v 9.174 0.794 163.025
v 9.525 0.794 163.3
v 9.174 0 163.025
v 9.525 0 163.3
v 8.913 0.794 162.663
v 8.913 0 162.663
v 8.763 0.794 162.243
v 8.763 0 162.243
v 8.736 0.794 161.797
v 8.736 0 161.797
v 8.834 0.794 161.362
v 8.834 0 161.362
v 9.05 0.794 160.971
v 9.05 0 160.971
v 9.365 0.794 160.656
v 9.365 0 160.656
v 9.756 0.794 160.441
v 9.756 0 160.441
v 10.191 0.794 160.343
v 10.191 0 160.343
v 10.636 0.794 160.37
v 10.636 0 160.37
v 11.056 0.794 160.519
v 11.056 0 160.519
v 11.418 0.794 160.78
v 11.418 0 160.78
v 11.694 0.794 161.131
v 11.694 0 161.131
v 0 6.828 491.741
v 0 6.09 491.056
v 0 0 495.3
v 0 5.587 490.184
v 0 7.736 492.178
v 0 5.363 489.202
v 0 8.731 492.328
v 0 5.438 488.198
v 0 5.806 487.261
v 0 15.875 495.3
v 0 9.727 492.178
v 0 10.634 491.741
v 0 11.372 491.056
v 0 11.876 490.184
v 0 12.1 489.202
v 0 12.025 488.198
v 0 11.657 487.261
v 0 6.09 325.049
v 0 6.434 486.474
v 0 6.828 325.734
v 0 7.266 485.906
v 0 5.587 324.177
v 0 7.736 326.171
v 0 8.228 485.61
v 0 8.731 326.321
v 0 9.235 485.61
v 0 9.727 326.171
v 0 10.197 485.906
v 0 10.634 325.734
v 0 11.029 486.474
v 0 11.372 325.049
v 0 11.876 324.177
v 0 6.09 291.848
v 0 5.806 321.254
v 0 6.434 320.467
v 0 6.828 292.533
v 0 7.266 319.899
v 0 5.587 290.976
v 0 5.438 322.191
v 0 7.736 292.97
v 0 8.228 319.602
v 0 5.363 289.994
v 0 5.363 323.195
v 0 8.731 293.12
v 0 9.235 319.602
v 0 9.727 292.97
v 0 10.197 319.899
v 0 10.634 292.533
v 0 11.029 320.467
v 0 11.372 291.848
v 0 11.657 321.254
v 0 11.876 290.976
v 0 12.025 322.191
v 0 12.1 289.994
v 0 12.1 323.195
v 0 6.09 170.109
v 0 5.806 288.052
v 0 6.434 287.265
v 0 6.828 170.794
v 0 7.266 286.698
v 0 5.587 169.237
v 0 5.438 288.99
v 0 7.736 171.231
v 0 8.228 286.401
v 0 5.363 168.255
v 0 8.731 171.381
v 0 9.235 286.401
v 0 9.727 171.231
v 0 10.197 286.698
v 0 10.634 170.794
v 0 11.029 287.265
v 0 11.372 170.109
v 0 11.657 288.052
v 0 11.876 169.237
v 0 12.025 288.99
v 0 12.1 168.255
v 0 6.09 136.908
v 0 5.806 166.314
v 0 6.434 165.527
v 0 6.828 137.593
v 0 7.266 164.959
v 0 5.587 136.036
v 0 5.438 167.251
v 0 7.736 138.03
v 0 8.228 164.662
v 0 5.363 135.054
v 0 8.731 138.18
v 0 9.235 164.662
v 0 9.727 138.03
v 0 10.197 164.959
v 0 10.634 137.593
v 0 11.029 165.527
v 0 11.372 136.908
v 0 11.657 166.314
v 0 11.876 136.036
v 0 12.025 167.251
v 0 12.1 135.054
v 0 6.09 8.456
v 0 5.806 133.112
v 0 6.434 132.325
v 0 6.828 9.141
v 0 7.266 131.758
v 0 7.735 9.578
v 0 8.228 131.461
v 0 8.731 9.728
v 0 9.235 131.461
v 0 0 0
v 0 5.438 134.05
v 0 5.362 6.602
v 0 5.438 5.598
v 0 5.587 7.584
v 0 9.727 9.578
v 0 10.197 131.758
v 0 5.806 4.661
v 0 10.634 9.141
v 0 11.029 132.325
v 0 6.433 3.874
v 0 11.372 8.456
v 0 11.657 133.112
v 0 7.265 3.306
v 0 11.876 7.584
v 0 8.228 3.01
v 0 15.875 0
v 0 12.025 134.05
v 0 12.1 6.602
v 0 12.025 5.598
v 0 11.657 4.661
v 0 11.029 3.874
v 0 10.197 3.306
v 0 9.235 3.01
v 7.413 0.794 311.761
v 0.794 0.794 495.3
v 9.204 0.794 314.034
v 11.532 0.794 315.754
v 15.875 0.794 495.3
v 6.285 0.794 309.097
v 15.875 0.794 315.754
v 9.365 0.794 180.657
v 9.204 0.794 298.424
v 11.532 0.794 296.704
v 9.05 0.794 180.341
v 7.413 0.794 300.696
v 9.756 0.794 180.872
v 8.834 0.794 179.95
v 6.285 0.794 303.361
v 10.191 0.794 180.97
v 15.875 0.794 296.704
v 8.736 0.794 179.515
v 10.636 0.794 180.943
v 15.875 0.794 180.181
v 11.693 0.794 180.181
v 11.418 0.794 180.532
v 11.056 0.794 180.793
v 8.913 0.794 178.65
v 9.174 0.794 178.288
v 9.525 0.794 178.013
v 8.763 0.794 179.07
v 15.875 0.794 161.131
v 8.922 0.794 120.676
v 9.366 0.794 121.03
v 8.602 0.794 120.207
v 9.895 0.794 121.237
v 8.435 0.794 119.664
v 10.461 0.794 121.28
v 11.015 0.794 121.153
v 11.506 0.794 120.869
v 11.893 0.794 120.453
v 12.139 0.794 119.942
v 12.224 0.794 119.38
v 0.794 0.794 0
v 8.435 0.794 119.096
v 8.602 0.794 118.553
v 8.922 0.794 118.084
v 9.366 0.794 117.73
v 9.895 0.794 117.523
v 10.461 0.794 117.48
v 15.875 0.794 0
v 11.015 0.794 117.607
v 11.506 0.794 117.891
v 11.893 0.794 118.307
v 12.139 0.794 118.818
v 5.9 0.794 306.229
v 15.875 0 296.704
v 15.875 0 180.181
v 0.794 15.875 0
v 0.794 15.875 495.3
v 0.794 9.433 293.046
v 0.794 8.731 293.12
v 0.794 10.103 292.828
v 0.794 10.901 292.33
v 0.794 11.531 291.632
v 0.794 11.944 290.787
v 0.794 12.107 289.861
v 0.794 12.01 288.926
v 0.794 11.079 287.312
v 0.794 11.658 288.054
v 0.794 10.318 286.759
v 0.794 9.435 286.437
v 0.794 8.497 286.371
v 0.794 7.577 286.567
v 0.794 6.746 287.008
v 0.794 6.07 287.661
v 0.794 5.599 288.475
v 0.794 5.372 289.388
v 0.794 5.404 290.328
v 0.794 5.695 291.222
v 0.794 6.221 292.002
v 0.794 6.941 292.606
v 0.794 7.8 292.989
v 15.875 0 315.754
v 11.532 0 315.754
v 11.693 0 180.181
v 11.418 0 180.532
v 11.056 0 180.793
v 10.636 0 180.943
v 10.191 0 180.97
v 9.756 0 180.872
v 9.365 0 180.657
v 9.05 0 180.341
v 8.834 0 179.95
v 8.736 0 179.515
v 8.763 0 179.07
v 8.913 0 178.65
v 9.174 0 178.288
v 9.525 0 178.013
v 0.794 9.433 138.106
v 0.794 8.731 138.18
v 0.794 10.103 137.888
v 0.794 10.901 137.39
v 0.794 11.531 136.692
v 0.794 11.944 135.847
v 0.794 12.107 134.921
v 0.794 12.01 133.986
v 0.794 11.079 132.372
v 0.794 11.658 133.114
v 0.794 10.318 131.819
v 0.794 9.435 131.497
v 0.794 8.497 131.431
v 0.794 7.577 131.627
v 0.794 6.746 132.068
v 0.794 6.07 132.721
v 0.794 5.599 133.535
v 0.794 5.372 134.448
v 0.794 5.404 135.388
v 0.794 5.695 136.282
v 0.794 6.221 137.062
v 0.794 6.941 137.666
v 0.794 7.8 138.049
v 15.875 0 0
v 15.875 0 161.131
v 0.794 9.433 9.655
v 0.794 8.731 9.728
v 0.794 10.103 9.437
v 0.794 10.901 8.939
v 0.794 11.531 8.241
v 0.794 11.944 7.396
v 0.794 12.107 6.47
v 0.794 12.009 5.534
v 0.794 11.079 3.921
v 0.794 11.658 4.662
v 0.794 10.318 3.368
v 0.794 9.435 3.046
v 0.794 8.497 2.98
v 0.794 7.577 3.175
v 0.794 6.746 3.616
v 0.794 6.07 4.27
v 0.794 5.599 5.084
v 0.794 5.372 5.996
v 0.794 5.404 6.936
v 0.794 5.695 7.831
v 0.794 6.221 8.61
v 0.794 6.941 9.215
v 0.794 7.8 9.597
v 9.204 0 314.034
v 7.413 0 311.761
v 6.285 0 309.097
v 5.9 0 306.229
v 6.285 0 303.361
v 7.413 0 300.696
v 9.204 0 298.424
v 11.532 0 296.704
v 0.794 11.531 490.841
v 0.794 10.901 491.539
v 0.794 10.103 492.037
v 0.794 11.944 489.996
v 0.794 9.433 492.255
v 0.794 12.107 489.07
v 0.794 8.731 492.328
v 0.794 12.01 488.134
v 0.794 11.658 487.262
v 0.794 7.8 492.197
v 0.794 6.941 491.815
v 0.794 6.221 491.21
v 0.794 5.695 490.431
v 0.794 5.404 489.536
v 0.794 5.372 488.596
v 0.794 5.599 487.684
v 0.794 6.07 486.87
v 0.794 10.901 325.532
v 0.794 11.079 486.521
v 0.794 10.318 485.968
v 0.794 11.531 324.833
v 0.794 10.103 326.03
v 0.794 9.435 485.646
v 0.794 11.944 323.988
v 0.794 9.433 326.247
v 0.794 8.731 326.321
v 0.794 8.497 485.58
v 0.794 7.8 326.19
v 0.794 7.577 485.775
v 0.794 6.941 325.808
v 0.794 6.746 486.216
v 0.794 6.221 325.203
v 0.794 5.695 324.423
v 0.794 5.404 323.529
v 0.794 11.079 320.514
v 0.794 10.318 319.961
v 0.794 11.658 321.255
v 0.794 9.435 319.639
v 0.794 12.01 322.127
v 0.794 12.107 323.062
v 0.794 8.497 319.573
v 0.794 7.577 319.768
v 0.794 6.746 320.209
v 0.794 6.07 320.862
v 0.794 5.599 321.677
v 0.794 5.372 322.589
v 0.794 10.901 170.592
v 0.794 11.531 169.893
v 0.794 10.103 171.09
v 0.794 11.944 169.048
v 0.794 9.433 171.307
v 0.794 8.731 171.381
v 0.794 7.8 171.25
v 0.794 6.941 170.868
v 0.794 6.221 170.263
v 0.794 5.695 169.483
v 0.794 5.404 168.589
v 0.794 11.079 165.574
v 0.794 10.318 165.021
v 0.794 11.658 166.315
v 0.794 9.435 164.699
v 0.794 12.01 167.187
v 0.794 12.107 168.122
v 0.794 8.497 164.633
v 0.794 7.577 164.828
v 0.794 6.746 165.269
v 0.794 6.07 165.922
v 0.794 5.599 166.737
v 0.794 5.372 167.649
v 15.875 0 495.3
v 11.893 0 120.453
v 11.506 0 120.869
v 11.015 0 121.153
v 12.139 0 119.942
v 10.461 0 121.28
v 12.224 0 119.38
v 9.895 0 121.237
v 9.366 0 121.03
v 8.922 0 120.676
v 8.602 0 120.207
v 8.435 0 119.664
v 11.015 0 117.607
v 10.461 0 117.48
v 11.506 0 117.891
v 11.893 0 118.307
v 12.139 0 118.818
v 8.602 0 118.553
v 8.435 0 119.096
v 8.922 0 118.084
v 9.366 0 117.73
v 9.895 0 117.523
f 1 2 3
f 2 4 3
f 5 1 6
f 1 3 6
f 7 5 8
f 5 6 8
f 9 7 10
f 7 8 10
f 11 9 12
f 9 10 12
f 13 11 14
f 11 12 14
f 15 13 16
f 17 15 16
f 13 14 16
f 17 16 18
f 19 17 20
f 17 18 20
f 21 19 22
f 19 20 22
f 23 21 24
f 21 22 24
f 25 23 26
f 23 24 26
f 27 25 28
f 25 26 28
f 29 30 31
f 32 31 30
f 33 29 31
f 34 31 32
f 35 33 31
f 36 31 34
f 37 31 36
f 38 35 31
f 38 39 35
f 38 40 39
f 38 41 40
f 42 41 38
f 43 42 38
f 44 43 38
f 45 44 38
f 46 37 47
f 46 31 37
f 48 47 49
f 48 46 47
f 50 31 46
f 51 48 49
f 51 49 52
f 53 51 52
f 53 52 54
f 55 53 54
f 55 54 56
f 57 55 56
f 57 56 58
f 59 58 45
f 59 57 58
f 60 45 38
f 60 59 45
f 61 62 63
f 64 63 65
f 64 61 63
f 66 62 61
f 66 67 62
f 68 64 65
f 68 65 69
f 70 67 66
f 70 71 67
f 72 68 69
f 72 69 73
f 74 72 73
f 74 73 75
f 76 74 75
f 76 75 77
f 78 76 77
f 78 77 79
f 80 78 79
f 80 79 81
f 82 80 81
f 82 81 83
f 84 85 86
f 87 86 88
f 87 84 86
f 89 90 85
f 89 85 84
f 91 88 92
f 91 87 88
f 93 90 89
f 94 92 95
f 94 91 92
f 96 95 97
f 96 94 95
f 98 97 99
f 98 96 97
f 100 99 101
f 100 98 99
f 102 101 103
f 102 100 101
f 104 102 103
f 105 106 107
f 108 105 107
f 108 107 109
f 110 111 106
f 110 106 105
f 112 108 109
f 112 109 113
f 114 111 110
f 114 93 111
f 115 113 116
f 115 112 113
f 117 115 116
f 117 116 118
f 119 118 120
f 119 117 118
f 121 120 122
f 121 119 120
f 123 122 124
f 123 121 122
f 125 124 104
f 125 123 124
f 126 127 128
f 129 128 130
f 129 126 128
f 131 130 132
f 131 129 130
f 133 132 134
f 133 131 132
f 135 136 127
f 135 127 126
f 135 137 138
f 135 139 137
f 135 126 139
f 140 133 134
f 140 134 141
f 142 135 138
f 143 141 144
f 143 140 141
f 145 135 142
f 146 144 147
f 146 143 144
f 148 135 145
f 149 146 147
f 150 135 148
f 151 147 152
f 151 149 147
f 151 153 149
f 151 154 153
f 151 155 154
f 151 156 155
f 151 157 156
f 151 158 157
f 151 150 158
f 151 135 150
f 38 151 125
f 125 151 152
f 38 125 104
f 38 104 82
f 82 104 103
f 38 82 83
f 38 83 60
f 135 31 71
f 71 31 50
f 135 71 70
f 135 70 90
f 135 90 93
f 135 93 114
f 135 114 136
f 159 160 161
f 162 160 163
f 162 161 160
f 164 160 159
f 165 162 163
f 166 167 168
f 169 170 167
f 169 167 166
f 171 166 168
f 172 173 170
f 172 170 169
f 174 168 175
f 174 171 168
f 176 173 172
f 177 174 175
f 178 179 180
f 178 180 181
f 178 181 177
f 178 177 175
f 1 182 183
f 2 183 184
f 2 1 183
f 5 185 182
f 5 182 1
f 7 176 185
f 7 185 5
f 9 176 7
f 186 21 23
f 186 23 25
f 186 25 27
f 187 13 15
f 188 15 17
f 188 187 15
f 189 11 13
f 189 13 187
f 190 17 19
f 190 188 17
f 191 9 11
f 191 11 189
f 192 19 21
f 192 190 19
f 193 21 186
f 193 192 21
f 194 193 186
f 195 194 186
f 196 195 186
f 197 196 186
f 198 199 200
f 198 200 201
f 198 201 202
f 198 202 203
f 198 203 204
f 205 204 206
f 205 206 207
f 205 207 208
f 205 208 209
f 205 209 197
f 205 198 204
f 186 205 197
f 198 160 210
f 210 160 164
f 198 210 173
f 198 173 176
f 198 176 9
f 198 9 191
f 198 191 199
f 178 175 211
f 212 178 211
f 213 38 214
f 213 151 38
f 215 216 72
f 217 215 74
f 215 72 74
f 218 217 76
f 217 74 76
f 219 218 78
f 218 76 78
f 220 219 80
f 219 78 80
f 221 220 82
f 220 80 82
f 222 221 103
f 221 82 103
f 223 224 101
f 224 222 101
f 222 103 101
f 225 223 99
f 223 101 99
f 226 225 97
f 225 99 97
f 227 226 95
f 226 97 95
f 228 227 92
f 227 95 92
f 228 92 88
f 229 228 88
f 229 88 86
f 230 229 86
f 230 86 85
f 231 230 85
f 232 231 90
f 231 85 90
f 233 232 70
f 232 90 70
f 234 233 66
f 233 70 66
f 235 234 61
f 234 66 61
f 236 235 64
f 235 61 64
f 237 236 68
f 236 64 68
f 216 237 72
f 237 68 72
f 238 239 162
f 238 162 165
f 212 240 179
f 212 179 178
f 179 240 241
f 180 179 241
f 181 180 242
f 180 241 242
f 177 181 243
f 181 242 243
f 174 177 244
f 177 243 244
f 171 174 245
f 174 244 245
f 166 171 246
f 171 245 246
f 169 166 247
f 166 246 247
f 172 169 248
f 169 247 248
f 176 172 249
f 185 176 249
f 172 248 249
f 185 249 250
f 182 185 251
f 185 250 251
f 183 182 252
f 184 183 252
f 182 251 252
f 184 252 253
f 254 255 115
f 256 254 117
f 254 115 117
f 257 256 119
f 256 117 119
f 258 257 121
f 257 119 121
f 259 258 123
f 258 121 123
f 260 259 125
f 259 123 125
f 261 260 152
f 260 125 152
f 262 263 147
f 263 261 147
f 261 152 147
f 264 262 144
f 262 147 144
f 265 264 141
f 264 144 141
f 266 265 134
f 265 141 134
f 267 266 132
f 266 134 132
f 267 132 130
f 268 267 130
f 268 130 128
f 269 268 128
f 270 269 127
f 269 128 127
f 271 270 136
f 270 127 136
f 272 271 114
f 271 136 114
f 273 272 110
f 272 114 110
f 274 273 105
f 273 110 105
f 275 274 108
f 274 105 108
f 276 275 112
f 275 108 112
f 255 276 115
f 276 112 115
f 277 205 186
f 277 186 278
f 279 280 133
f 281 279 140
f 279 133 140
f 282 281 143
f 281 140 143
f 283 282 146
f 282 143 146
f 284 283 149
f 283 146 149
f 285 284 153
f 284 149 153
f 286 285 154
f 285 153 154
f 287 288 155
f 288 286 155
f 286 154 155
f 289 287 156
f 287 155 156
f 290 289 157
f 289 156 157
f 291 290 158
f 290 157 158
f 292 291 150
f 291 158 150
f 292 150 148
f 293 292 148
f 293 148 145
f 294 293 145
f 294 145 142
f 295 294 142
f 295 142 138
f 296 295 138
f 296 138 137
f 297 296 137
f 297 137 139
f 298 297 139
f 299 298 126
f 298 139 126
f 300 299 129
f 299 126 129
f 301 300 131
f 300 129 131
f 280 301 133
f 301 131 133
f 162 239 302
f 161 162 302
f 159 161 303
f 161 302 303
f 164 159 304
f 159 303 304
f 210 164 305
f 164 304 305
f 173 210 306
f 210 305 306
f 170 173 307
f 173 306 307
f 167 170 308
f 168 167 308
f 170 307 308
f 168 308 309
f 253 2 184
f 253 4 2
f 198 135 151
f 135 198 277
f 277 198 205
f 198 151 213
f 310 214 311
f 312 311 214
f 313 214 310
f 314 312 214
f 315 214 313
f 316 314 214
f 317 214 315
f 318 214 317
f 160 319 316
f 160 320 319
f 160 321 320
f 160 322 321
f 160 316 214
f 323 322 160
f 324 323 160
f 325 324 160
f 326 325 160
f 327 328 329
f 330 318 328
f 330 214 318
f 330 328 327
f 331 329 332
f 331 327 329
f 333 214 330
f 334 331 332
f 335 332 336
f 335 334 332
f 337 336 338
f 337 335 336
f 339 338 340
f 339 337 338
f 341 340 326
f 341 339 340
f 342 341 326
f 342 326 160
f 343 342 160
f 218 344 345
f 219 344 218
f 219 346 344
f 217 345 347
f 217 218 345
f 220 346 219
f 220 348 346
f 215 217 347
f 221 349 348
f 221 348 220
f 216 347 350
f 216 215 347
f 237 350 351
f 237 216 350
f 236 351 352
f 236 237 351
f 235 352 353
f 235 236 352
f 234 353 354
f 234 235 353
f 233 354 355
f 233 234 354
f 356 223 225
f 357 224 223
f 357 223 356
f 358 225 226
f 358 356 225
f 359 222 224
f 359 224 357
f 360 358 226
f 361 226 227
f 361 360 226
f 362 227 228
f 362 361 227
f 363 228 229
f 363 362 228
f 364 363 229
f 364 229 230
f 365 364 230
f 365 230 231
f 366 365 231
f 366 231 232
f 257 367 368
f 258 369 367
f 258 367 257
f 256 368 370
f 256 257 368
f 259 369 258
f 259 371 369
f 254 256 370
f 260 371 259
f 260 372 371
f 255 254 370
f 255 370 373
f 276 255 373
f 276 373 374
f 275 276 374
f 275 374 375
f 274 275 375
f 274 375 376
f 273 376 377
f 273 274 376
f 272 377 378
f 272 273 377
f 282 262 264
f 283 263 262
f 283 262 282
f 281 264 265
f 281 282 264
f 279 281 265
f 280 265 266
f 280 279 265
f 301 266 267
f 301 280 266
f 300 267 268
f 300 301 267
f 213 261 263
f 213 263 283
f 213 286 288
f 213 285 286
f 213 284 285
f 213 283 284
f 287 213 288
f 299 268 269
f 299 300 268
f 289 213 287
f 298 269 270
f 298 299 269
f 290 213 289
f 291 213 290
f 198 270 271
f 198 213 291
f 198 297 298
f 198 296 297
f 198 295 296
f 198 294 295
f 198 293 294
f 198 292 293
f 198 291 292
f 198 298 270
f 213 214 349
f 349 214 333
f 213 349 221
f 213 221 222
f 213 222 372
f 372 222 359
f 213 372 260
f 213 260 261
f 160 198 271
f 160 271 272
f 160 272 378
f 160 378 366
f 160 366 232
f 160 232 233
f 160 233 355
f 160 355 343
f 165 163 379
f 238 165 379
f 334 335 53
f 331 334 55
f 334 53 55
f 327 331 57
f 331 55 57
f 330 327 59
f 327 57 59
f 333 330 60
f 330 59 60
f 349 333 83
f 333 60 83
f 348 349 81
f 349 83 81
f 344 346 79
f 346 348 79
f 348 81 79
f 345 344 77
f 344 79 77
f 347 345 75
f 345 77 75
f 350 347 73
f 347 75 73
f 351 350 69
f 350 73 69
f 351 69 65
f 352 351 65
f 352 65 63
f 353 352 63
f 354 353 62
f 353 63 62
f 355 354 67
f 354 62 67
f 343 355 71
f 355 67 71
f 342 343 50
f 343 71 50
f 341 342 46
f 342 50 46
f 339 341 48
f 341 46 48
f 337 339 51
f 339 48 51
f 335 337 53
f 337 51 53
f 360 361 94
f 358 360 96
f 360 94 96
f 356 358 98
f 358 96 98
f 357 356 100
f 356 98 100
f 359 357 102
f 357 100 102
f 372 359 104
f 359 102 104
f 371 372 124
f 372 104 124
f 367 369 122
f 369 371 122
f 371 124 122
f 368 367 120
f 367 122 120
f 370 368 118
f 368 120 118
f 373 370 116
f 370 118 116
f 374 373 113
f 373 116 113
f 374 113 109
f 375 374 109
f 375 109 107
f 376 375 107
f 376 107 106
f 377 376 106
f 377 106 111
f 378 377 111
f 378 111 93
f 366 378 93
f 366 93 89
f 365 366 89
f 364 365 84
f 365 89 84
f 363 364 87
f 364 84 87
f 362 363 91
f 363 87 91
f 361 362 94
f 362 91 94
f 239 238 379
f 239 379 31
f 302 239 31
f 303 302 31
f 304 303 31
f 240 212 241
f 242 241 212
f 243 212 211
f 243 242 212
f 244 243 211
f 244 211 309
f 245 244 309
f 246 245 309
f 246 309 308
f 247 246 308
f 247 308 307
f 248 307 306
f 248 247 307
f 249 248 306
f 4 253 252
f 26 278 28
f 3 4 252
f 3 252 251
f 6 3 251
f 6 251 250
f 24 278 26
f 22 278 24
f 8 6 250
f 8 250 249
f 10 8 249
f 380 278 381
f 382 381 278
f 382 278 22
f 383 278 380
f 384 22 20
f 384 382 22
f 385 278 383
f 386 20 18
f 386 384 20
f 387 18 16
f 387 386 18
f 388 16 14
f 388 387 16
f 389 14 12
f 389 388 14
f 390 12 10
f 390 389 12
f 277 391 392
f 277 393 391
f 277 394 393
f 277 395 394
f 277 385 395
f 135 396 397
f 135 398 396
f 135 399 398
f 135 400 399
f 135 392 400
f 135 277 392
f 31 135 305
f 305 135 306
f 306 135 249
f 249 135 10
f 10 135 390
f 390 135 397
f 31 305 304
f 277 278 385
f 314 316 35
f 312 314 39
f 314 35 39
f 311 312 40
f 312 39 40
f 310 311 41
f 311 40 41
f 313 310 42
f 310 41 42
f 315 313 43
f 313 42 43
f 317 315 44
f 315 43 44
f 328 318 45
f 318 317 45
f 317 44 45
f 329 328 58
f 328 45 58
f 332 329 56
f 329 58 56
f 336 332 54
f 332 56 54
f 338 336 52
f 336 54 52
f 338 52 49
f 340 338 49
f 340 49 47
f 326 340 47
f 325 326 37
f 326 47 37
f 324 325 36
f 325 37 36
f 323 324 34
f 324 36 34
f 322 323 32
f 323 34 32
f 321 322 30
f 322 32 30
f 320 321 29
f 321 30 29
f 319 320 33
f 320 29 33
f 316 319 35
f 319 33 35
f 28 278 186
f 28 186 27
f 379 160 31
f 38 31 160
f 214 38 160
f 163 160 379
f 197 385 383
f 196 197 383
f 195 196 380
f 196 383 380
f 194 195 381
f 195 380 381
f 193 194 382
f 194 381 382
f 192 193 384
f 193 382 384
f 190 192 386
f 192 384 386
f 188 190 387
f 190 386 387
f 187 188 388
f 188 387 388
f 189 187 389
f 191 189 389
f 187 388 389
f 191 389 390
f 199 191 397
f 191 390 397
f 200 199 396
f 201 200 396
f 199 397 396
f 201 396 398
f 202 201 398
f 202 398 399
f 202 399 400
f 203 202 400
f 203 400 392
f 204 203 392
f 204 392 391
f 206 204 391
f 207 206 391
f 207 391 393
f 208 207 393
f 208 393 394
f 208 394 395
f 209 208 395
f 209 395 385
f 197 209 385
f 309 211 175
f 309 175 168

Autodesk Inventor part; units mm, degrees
ref_plane "YZ Plane" through (0, 0, 0) normal (1, 0, 0) x (0, 1, 0)
ref_plane "XZ Plane" through (0, 0, 0) normal (0, 1, 0) x (-1, 0, 0)
ref_plane "XY Plane" through (0, 0, 0) normal (0, 0, 1) x (1, 0, 0)
sketch "Sketch1" plane through (0, 0, 0) normal (0, 0, 1) x (1, 0, 0)
  line L0 (0, 0) -> (0, 15.875)
  line L1 (0, 15.875) -> (0.7937, 15.875)
  line L2 (0.7937, 15.875) -> (0.7938, 0.7937)
  line L3 (0.7938, 0.7937) -> (15.875, 0.7937)
  line L4 (15.875, 0.7937) -> (15.875, 0)
  line L5 (15.875, 0) -> (0, 0)
  dimension "d0" = 15.875
  dimension "d1" = 0.7937
extrude "Extrusion1" add sketch "Sketch1" along normal blind 495.3
sketch "Sketch2" plane through (0, 0, 0) normal (0, -1, 0) x (1, 0, 0)
  line L0 (15.875, 0) -> (15.875, 495.3) projected
  line L1 (14.2875, 178.5938) -> (14.2875, 162.7188) construction
  line L2 (14.2875, 162.7188) -> (15.0813, 162.7188) construction
  line L3 (15.0813, 162.7188) -> (15.0813, 177.8) construction
  line L4 (15.0813, 177.8) -> (30.1625, 177.8) construction
  line L5 (30.1625, 177.8) -> (30.1625, 178.5938) construction
  line L6 (30.1625, 178.5938) -> (14.2875, 178.5938) construction
  line L7 (15.875, 161.1313) -> (9.525, 161.1313)
  line L8 (9.525, 161.1313) -> (9.525, 180.1813)
  line L9 (9.525, 180.1813) -> (15.875, 180.1813)
  line L10 (14.2875, 170.6563) -> (15.875, 170.6563) construction
  circle A0 centre (10.3187, 179.3875) radius 1.5875
  circle A1 centre (10.3187, 161.925) radius 1.5875
  circle A2 centre (10.3187, 119.38) radius 1.905 projected
  circle A3 centre (16.7716, 306.2288) radius 8.255 projected
  arc A4 (22.0116, 315.7538) -> (11.5316, 315.7538) centre (16.7716, 306.2288) ccw construction
  line L11 (11.5316, 315.7538) -> (22.0116, 315.7538) projected
  arc A5 (11.5316, 296.7038) -> (22.0116, 296.7038) centre (16.7716, 306.2288) ccw construction
  line L12 (22.0116, 296.7038) -> (11.5316, 296.7038) projected
  arc A6 (22.0116, 296.7038) -> (22.0116, 315.7538) centre (16.7716, 306.2288) ccw
  arc A7 (11.5316, 315.7538) -> (11.5316, 296.7038) centre (16.7716, 306.2288) ccw
  point P0 (9.525, 170.6563)
  dimension "d4" = 6.35
  dimension "d5" = 19.05
  dimension "d8" = 3.175
  dimension "d9" = 0.7937
  dimension "d10" = 0.7937
  dimension "d11" = 0.7937
  dimension "d12" = 0.7937
extrude "Extrusion2" cut sketch "Sketch2" against normal through all
sketch "Sketch3" plane through (0, 0, 0) normal (-1, 0, 0) x (0, 0, 1)
  line L0 (219.2782, 408.7812) -> (219.2782, 103.9812) construction
  arc A0 (212.5218, 103.9812) -> (219.2782, 103.9812) centre (215.9, 103.9812) ccw construction
  line L1 (212.5218, 103.9812) -> (212.5218, 408.7812) construction
  arc A1 (219.2782, 408.7812) -> (212.5218, 408.7812) centre (215.9, 408.7812) ccw construction
  circle A2 centre (215.9, 472.2812) radius 3.3782 construction
  circle A3 centre (215.9, 440.5312) radius 3.3782 construction
  line L2 (228.6, 484.9812) -> (330.2, 484.9812) construction
  line L3 (330.2, 484.9812) -> (330.2, 15.0812) construction
  line L4 (330.2, 15.0812) -> (228.6, 15.0812) construction
  line L5 (228.6, 484.9812) -> (228.6, 15.0812) construction
  line L6 (346.2782, 408.7812) -> (346.2782, 103.9812) construction
  arc A4 (339.5218, 103.9812) -> (346.2782, 103.9812) centre (342.9, 103.9812) ccw construction
  line L7 (339.5218, 103.9812) -> (339.5218, 408.7812) construction
  arc A5 (346.2782, 408.7812) -> (339.5218, 408.7812) centre (342.9, 408.7812) ccw construction
  line L8 (495.3, 2.3812) -> (495.3, 497.6812) construction
  line L9 (495.3, 497.6812) -> (0, 497.6812) construction
  line L10 (0, 497.6812) -> (0, 2.3812) construction
  line L11 (0, 2.3812) -> (495.3, 2.3812) construction
  circle A6 centre (488.95, 8.7313) radius 3.3782 projected
  circle A7 centre (488.95, 18.5802) radius 3.3782 construction
  circle A8 centre (488.95, 28.4292) radius 3.3782 construction
  circle A9 centre (488.95, 38.2782) radius 3.3782 construction
  circle A10 centre (488.95, 48.1272) radius 3.3782 construction
  circle A11 centre (488.95, 57.9761) radius 3.3782 construction
  circle A12 centre (488.95, 67.8251) radius 3.3782 construction
  circle A13 centre (488.95, 77.6741) radius 3.3782 construction
  circle A14 centre (488.95, 87.5231) radius 3.3782 construction
  circle A15 centre (488.95, 117.07) radius 3.3782 construction
  circle A16 centre (488.95, 126.919) radius 3.3782 construction
  circle A17 centre (488.95, 136.768) radius 3.3782 construction
  circle A18 centre (488.95, 146.617) radius 3.3782 construction
  circle A19 centre (488.95, 156.4659) radius 3.3782 construction
  circle A20 centre (488.95, 166.3149) radius 3.3782 construction
  circle A21 centre (488.95, 176.1639) radius 3.3782 construction
  circle A22 centre (488.95, 186.0129) radius 3.3782 construction
  circle A23 centre (488.95, 195.8619) radius 3.3782 construction
  circle A24 centre (488.95, 205.7108) radius 3.3782 construction
  circle A25 centre (488.95, 215.5598) radius 3.3782 construction
  circle A26 centre (488.95, 225.4088) radius 3.3782 construction
  circle A27 centre (488.95, 235.2578) radius 3.3782 construction
  circle A28 centre (488.95, 245.1068) radius 3.3782 construction
  circle A29 centre (488.95, 254.9557) radius 3.3782 construction
  circle A30 centre (488.95, 264.8047) radius 3.3782 construction
  circle A31 centre (488.95, 274.6537) radius 3.3782 construction
  circle A32 centre (488.95, 284.5027) radius 3.3782 construction
  circle A33 centre (488.95, 294.3517) radius 3.3782 construction
  circle A34 centre (488.95, 304.2006) radius 3.3782 construction
  circle A35 centre (488.95, 314.0496) radius 3.3782 construction
  circle A36 centre (488.95, 323.8986) radius 3.3782 construction
  circle A37 centre (488.95, 333.7476) radius 3.3782 construction
  circle A38 centre (488.95, 343.5966) radius 3.3782 construction
  circle A39 centre (488.95, 353.4455) radius 3.3782 construction
  circle A40 centre (488.95, 363.2945) radius 3.3782 construction
  circle A41 centre (488.95, 373.1435) radius 3.3782 construction
  circle A42 centre (488.95, 382.9925) radius 3.3782 construction
  circle A43 centre (488.95, 392.8415) radius 3.3782 construction
  circle A44 centre (488.95, 402.6904) radius 3.3782 construction
  circle A45 centre (488.95, 412.5394) radius 3.3782 construction
  circle A46 centre (488.95, 422.3884) radius 3.3782 construction
  circle A47 centre (488.95, 432.2374) radius 3.3782 construction
  circle A48 centre (488.95, 442.0864) radius 3.3782 construction
  circle A49 centre (488.95, 451.9353) radius 3.3782 construction
  circle A50 centre (488.95, 461.7843) radius 3.3782 construction
  circle A51 centre (488.95, 471.6333) radius 3.3782 construction
  circle A52 centre (488.95, 481.4823) radius 3.3782 construction
  circle A53 centre (488.95, 491.3312) radius 3.3782 construction
  circle A54 centre (6.35, 8.7312) radius 3.3782 projected
  circle A55 centre (6.35, 18.5802) radius 3.3782 construction
  circle A56 centre (6.35, 28.4292) radius 3.3782 construction
  circle A57 centre (6.35, 38.2782) radius 3.3782 construction
  circle A58 centre (6.35, 48.1272) radius 3.3782 construction
  circle A59 centre (6.35, 57.9761) radius 3.3782 construction
  circle A60 centre (6.35, 67.8251) radius 3.3782 construction
  circle A61 centre (6.35, 77.6741) radius 3.3782 construction
  circle A62 centre (6.35, 87.5231) radius 3.3782 construction
  circle A63 centre (6.35, 97.3721) radius 3.3782 construction
  circle A64 centre (6.35, 107.221) radius 3.3782 construction
  circle A65 centre (6.35, 117.07) radius 3.3782 construction
  circle A66 centre (6.35, 126.919) radius 3.3782 construction
  circle A67 centre (6.35, 136.768) radius 3.3782 construction
  circle A68 centre (6.35, 146.617) radius 3.3782 construction
  circle A69 centre (6.35, 156.4659) radius 3.3782 construction
  circle A70 centre (6.35, 166.3149) radius 3.3782 construction
  circle A71 centre (6.35, 176.1639) radius 3.3782 construction
  circle A72 centre (6.35, 186.0129) radius 3.3782 construction
  circle A73 centre (6.35, 195.8619) radius 3.3782 construction
  circle A74 centre (6.35, 205.7108) radius 3.3782 construction
  circle A75 centre (6.35, 215.5598) radius 3.3782 construction
  circle A76 centre (6.35, 225.4088) radius 3.3782 construction
  circle A77 centre (6.35, 235.2578) radius 3.3782 construction
  circle A78 centre (6.35, 245.1068) radius 3.3782 construction
  circle A79 centre (6.35, 254.9557) radius 3.3782 construction
  circle A80 centre (6.35, 264.8047) radius 3.3782 construction
  circle A81 centre (6.35, 274.6537) radius 3.3782 construction
  circle A82 centre (6.35, 284.5027) radius 3.3782 construction
  circle A83 centre (6.35, 294.3517) radius 3.3782 construction
  circle A84 centre (6.35, 304.2006) radius 3.3782 construction
  circle A85 centre (6.35, 314.0496) radius 3.3782 construction
  circle A86 centre (6.35, 323.8986) radius 3.3782 construction
  circle A87 centre (6.35, 333.7476) radius 3.3782 construction
  circle A88 centre (6.35, 343.5966) radius 3.3782 construction
  circle A89 centre (6.35, 353.4455) radius 3.3782 construction
  circle A90 centre (6.35, 363.2945) radius 3.3782 construction
  circle A91 centre (6.35, 373.1435) radius 3.3782 construction
  circle A92 centre (6.35, 382.9925) radius 3.3782 construction
  circle A93 centre (6.35, 392.8415) radius 3.3782 construction
  circle A94 centre (6.35, 402.6904) radius 3.3782 construction
  circle A95 centre (6.35, 412.5394) radius 3.3782 construction
  circle A96 centre (6.35, 422.3884) radius 3.3782 construction
  circle A97 centre (6.35, 432.2374) radius 3.3782 construction
  circle A98 centre (6.35, 442.0864) radius 3.3782 construction
  circle A99 centre (6.35, 451.9353) radius 3.3782 construction
  circle A100 centre (6.35, 461.7843) radius 3.3782 construction
  circle A101 centre (6.35, 471.6333) radius 3.3782 construction
  circle A102 centre (6.35, 481.4823) radius 3.3782 construction
  circle A103 centre (6.35, 491.3312) radius 3.3782 construction
  circle A104 centre (477.8829, 8.7313) radius 3.3782 construction
  circle A105 centre (477.8829, 491.3312) radius 3.3782 construction
  circle A106 centre (466.8157, 8.7313) radius 3.3782 construction
  circle A107 centre (466.8157, 491.3312) radius 3.3782 construction
  circle A108 centre (455.7486, 8.7313) radius 3.3782 construction
  circle A109 centre (455.7486, 491.3312) radius 3.3782 construction
  circle A110 centre (444.6814, 8.7313) radius 3.3782 construction
  circle A111 centre (444.6814, 491.3312) radius 3.3782 construction
  circle A112 centre (433.6143, 8.7313) radius 3.3782 construction
  circle A113 centre (433.6143, 491.3312) radius 3.3782 construction
  circle A114 centre (422.5471, 8.7313) radius 3.3782 construction
  circle A115 centre (422.5471, 491.3312) radius 3.3782 construction
  circle A116 centre (411.48, 8.7313) radius 3.3782 construction
  circle A117 centre (411.48, 491.3312) radius 3.3782 construction
  circle A118 centre (400.4129, 8.7313) radius 3.3782 construction
  circle A119 centre (400.4129, 491.3312) radius 3.3782 construction
  circle A120 centre (389.3457, 8.7313) radius 3.3782 construction
  circle A121 centre (389.3457, 491.3312) radius 3.3782 construction
  circle A122 centre (378.2786, 8.7313) radius 3.3782 construction
  circle A123 centre (378.2786, 491.3312) radius 3.3782 construction
  circle A124 centre (367.2114, 8.7313) radius 3.3782 construction
  circle A125 centre (367.2114, 491.3312) radius 3.3782 construction
  circle A126 centre (356.1443, 8.7313) radius 3.3782 construction
  circle A127 centre (356.1443, 491.3312) radius 3.3782 construction
  circle A128 centre (345.0771, 8.7313) radius 3.3782 construction
  circle A129 centre (345.0771, 491.3312) radius 3.3782 construction
  circle A130 centre (334.01, 8.7313) radius 3.3782 construction
  circle A131 centre (334.01, 491.3312) radius 3.3782 construction
  circle A132 centre (322.9429, 8.7313) radius 3.3782 projected
  circle A133 centre (322.9429, 491.3312) radius 3.3782 construction
  circle A134 centre (311.8757, 8.7313) radius 3.3782 construction
  circle A135 centre (311.8757, 491.3312) radius 3.3782 construction
  circle A136 centre (300.8086, 8.7313) radius 3.3782 construction
  circle A137 centre (300.8086, 491.3312) radius 3.3782 construction
  circle A138 centre (289.7414, 8.7313) radius 3.3782 projected
  circle A139 centre (289.7414, 491.3312) radius 3.3782 construction
  circle A140 centre (278.6743, 8.7313) radius 3.3782 construction
  circle A141 centre (278.6743, 491.3312) radius 3.3782 construction
  circle A142 centre (267.6071, 8.7313) radius 3.3782 construction
  circle A143 centre (267.6071, 491.3312) radius 3.3782 construction
  circle A144 centre (256.54, 8.7313) radius 3.3782 construction
  circle A145 centre (256.54, 491.3312) radius 3.3782 construction
  circle A146 centre (245.4729, 8.7313) radius 3.3782 construction
  circle A147 centre (245.4729, 491.3312) radius 3.3782 construction
  circle A148 centre (234.4057, 8.7313) radius 3.3782 construction
  circle A149 centre (234.4057, 491.3312) radius 3.3782 construction
  circle A150 centre (223.3386, 8.7313) radius 3.3782 construction
  circle A151 centre (223.3386, 491.3312) radius 3.3782 construction
  circle A152 centre (212.2714, 8.7313) radius 3.3782 construction
  circle A153 centre (212.2714, 491.3312) radius 3.3782 construction
  circle A154 centre (201.2043, 8.7313) radius 3.3782 construction
  circle A155 centre (201.2043, 491.3312) radius 3.3782 construction
  circle A156 centre (190.1371, 8.7313) radius 3.3782 construction
  circle A157 centre (190.1371, 491.3312) radius 3.3782 construction
  circle A158 centre (179.07, 8.7313) radius 3.3782 construction
  circle A159 centre (179.07, 491.3312) radius 3.3782 construction
  circle A160 centre (168.0029, 8.7313) radius 3.3782 projected
  circle A161 centre (168.0029, 491.3312) radius 3.3782 construction
  circle A162 centre (156.9357, 8.7313) radius 3.3782 construction
  circle A163 centre (156.9357, 491.3312) radius 3.3782 construction
  circle A164 centre (145.8686, 8.7313) radius 3.3782 construction
  circle A165 centre (145.8686, 491.3312) radius 3.3782 construction
  circle A166 centre (134.8014, 8.7313) radius 3.3782 projected
  circle A167 centre (134.8014, 491.3312) radius 3.3782 construction
  circle A168 centre (123.7343, 8.7313) radius 3.3782 construction
  circle A169 centre (123.7343, 491.3312) radius 3.3782 construction
  circle A170 centre (112.6671, 8.7313) radius 3.3782 construction
  circle A171 centre (112.6671, 491.3312) radius 3.3782 construction
  circle A172 centre (18.2563, 8.7312) radius 3.3782 construction
  circle A173 centre (18.2563, 491.3312) radius 3.3782 construction
  circle A174 centre (30.1625, 8.7312) radius 3.3782 construction
  circle A175 centre (30.1625, 491.3312) radius 3.3782 construction
  circle A176 centre (42.0688, 8.7312) radius 3.3782 construction
  circle A177 centre (42.0688, 491.3312) radius 3.3782 construction
  circle A178 centre (53.975, 8.7312) radius 3.3782 construction
  circle A179 centre (53.975, 491.3312) radius 3.3782 construction
  circle A180 centre (65.8813, 8.7312) radius 3.3782 construction
  circle A181 centre (65.8813, 491.3312) radius 3.3782 construction
  circle A182 centre (77.7875, 8.7312) radius 3.3782 construction
  circle A183 centre (77.7875, 491.3312) radius 3.3782 construction
  circle A184 centre (89.6938, 8.7312) radius 3.3782 construction
  circle A185 centre (89.6938, 491.3312) radius 3.3782 construction
  circle A186 centre (101.6, 8.7312) radius 3.3782 construction
  circle A187 centre (101.6, 491.3312) radius 3.3782 construction
  line L12 (203.2, 15.0812) -> (203.2, 484.9812) construction
  line L13 (203.2, 15.0812) -> (12.7, 15.0812) construction
  line L14 (12.7, 15.0812) -> (12.7, 484.9812) construction
  line L15 (12.7, 484.9812) -> (203.2, 484.9812) construction
  line L16 (355.6, 484.9812) -> (482.6, 484.9812) construction
  line L17 (482.6, 484.9812) -> (482.6, 15.0812) construction
  line L18 (482.6, 15.0812) -> (355.6, 15.0812) construction
  line L19 (355.6, 15.0812) -> (355.6, 484.9812) construction
  arc A188 (487.5398, 100.4418) -> (490.3602, 100.4418) centre (488.95, 97.3721) ccw projected
  arc A189 (492.1297, 106.0802) -> (485.7703, 106.0802) centre (488.95, 107.221) ccw projected
  arc A190 (485.7703, 106.0802) -> (487.5398, 100.4418) centre (488.95, 103.9812) ccw projected
  arc A191 (490.3602, 100.4418) -> (492.1297, 106.0802) centre (488.95, 103.9812) ccw projected
  ellipse E0 centre (342.9016, 472.2812) end of major axis (342.9016, 468.903) minor radius 3.3782 projected
  ellipse E1 centre (342.9016, 440.5312) end of major axis (342.9016, 443.9094) minor radius 3.3782 projected
extrude "Extrusion3" cut sketch "Sketch3" against normal through all contours A6 | A54 | A132 | A138 | A160 | A166
equation "\"d10\" = d9"
equation "\"d11\" = d10"
equation "\"d12\" = d11"
properties part number "Shooter Side Support Bar - L" material "Aluminum 6061"
